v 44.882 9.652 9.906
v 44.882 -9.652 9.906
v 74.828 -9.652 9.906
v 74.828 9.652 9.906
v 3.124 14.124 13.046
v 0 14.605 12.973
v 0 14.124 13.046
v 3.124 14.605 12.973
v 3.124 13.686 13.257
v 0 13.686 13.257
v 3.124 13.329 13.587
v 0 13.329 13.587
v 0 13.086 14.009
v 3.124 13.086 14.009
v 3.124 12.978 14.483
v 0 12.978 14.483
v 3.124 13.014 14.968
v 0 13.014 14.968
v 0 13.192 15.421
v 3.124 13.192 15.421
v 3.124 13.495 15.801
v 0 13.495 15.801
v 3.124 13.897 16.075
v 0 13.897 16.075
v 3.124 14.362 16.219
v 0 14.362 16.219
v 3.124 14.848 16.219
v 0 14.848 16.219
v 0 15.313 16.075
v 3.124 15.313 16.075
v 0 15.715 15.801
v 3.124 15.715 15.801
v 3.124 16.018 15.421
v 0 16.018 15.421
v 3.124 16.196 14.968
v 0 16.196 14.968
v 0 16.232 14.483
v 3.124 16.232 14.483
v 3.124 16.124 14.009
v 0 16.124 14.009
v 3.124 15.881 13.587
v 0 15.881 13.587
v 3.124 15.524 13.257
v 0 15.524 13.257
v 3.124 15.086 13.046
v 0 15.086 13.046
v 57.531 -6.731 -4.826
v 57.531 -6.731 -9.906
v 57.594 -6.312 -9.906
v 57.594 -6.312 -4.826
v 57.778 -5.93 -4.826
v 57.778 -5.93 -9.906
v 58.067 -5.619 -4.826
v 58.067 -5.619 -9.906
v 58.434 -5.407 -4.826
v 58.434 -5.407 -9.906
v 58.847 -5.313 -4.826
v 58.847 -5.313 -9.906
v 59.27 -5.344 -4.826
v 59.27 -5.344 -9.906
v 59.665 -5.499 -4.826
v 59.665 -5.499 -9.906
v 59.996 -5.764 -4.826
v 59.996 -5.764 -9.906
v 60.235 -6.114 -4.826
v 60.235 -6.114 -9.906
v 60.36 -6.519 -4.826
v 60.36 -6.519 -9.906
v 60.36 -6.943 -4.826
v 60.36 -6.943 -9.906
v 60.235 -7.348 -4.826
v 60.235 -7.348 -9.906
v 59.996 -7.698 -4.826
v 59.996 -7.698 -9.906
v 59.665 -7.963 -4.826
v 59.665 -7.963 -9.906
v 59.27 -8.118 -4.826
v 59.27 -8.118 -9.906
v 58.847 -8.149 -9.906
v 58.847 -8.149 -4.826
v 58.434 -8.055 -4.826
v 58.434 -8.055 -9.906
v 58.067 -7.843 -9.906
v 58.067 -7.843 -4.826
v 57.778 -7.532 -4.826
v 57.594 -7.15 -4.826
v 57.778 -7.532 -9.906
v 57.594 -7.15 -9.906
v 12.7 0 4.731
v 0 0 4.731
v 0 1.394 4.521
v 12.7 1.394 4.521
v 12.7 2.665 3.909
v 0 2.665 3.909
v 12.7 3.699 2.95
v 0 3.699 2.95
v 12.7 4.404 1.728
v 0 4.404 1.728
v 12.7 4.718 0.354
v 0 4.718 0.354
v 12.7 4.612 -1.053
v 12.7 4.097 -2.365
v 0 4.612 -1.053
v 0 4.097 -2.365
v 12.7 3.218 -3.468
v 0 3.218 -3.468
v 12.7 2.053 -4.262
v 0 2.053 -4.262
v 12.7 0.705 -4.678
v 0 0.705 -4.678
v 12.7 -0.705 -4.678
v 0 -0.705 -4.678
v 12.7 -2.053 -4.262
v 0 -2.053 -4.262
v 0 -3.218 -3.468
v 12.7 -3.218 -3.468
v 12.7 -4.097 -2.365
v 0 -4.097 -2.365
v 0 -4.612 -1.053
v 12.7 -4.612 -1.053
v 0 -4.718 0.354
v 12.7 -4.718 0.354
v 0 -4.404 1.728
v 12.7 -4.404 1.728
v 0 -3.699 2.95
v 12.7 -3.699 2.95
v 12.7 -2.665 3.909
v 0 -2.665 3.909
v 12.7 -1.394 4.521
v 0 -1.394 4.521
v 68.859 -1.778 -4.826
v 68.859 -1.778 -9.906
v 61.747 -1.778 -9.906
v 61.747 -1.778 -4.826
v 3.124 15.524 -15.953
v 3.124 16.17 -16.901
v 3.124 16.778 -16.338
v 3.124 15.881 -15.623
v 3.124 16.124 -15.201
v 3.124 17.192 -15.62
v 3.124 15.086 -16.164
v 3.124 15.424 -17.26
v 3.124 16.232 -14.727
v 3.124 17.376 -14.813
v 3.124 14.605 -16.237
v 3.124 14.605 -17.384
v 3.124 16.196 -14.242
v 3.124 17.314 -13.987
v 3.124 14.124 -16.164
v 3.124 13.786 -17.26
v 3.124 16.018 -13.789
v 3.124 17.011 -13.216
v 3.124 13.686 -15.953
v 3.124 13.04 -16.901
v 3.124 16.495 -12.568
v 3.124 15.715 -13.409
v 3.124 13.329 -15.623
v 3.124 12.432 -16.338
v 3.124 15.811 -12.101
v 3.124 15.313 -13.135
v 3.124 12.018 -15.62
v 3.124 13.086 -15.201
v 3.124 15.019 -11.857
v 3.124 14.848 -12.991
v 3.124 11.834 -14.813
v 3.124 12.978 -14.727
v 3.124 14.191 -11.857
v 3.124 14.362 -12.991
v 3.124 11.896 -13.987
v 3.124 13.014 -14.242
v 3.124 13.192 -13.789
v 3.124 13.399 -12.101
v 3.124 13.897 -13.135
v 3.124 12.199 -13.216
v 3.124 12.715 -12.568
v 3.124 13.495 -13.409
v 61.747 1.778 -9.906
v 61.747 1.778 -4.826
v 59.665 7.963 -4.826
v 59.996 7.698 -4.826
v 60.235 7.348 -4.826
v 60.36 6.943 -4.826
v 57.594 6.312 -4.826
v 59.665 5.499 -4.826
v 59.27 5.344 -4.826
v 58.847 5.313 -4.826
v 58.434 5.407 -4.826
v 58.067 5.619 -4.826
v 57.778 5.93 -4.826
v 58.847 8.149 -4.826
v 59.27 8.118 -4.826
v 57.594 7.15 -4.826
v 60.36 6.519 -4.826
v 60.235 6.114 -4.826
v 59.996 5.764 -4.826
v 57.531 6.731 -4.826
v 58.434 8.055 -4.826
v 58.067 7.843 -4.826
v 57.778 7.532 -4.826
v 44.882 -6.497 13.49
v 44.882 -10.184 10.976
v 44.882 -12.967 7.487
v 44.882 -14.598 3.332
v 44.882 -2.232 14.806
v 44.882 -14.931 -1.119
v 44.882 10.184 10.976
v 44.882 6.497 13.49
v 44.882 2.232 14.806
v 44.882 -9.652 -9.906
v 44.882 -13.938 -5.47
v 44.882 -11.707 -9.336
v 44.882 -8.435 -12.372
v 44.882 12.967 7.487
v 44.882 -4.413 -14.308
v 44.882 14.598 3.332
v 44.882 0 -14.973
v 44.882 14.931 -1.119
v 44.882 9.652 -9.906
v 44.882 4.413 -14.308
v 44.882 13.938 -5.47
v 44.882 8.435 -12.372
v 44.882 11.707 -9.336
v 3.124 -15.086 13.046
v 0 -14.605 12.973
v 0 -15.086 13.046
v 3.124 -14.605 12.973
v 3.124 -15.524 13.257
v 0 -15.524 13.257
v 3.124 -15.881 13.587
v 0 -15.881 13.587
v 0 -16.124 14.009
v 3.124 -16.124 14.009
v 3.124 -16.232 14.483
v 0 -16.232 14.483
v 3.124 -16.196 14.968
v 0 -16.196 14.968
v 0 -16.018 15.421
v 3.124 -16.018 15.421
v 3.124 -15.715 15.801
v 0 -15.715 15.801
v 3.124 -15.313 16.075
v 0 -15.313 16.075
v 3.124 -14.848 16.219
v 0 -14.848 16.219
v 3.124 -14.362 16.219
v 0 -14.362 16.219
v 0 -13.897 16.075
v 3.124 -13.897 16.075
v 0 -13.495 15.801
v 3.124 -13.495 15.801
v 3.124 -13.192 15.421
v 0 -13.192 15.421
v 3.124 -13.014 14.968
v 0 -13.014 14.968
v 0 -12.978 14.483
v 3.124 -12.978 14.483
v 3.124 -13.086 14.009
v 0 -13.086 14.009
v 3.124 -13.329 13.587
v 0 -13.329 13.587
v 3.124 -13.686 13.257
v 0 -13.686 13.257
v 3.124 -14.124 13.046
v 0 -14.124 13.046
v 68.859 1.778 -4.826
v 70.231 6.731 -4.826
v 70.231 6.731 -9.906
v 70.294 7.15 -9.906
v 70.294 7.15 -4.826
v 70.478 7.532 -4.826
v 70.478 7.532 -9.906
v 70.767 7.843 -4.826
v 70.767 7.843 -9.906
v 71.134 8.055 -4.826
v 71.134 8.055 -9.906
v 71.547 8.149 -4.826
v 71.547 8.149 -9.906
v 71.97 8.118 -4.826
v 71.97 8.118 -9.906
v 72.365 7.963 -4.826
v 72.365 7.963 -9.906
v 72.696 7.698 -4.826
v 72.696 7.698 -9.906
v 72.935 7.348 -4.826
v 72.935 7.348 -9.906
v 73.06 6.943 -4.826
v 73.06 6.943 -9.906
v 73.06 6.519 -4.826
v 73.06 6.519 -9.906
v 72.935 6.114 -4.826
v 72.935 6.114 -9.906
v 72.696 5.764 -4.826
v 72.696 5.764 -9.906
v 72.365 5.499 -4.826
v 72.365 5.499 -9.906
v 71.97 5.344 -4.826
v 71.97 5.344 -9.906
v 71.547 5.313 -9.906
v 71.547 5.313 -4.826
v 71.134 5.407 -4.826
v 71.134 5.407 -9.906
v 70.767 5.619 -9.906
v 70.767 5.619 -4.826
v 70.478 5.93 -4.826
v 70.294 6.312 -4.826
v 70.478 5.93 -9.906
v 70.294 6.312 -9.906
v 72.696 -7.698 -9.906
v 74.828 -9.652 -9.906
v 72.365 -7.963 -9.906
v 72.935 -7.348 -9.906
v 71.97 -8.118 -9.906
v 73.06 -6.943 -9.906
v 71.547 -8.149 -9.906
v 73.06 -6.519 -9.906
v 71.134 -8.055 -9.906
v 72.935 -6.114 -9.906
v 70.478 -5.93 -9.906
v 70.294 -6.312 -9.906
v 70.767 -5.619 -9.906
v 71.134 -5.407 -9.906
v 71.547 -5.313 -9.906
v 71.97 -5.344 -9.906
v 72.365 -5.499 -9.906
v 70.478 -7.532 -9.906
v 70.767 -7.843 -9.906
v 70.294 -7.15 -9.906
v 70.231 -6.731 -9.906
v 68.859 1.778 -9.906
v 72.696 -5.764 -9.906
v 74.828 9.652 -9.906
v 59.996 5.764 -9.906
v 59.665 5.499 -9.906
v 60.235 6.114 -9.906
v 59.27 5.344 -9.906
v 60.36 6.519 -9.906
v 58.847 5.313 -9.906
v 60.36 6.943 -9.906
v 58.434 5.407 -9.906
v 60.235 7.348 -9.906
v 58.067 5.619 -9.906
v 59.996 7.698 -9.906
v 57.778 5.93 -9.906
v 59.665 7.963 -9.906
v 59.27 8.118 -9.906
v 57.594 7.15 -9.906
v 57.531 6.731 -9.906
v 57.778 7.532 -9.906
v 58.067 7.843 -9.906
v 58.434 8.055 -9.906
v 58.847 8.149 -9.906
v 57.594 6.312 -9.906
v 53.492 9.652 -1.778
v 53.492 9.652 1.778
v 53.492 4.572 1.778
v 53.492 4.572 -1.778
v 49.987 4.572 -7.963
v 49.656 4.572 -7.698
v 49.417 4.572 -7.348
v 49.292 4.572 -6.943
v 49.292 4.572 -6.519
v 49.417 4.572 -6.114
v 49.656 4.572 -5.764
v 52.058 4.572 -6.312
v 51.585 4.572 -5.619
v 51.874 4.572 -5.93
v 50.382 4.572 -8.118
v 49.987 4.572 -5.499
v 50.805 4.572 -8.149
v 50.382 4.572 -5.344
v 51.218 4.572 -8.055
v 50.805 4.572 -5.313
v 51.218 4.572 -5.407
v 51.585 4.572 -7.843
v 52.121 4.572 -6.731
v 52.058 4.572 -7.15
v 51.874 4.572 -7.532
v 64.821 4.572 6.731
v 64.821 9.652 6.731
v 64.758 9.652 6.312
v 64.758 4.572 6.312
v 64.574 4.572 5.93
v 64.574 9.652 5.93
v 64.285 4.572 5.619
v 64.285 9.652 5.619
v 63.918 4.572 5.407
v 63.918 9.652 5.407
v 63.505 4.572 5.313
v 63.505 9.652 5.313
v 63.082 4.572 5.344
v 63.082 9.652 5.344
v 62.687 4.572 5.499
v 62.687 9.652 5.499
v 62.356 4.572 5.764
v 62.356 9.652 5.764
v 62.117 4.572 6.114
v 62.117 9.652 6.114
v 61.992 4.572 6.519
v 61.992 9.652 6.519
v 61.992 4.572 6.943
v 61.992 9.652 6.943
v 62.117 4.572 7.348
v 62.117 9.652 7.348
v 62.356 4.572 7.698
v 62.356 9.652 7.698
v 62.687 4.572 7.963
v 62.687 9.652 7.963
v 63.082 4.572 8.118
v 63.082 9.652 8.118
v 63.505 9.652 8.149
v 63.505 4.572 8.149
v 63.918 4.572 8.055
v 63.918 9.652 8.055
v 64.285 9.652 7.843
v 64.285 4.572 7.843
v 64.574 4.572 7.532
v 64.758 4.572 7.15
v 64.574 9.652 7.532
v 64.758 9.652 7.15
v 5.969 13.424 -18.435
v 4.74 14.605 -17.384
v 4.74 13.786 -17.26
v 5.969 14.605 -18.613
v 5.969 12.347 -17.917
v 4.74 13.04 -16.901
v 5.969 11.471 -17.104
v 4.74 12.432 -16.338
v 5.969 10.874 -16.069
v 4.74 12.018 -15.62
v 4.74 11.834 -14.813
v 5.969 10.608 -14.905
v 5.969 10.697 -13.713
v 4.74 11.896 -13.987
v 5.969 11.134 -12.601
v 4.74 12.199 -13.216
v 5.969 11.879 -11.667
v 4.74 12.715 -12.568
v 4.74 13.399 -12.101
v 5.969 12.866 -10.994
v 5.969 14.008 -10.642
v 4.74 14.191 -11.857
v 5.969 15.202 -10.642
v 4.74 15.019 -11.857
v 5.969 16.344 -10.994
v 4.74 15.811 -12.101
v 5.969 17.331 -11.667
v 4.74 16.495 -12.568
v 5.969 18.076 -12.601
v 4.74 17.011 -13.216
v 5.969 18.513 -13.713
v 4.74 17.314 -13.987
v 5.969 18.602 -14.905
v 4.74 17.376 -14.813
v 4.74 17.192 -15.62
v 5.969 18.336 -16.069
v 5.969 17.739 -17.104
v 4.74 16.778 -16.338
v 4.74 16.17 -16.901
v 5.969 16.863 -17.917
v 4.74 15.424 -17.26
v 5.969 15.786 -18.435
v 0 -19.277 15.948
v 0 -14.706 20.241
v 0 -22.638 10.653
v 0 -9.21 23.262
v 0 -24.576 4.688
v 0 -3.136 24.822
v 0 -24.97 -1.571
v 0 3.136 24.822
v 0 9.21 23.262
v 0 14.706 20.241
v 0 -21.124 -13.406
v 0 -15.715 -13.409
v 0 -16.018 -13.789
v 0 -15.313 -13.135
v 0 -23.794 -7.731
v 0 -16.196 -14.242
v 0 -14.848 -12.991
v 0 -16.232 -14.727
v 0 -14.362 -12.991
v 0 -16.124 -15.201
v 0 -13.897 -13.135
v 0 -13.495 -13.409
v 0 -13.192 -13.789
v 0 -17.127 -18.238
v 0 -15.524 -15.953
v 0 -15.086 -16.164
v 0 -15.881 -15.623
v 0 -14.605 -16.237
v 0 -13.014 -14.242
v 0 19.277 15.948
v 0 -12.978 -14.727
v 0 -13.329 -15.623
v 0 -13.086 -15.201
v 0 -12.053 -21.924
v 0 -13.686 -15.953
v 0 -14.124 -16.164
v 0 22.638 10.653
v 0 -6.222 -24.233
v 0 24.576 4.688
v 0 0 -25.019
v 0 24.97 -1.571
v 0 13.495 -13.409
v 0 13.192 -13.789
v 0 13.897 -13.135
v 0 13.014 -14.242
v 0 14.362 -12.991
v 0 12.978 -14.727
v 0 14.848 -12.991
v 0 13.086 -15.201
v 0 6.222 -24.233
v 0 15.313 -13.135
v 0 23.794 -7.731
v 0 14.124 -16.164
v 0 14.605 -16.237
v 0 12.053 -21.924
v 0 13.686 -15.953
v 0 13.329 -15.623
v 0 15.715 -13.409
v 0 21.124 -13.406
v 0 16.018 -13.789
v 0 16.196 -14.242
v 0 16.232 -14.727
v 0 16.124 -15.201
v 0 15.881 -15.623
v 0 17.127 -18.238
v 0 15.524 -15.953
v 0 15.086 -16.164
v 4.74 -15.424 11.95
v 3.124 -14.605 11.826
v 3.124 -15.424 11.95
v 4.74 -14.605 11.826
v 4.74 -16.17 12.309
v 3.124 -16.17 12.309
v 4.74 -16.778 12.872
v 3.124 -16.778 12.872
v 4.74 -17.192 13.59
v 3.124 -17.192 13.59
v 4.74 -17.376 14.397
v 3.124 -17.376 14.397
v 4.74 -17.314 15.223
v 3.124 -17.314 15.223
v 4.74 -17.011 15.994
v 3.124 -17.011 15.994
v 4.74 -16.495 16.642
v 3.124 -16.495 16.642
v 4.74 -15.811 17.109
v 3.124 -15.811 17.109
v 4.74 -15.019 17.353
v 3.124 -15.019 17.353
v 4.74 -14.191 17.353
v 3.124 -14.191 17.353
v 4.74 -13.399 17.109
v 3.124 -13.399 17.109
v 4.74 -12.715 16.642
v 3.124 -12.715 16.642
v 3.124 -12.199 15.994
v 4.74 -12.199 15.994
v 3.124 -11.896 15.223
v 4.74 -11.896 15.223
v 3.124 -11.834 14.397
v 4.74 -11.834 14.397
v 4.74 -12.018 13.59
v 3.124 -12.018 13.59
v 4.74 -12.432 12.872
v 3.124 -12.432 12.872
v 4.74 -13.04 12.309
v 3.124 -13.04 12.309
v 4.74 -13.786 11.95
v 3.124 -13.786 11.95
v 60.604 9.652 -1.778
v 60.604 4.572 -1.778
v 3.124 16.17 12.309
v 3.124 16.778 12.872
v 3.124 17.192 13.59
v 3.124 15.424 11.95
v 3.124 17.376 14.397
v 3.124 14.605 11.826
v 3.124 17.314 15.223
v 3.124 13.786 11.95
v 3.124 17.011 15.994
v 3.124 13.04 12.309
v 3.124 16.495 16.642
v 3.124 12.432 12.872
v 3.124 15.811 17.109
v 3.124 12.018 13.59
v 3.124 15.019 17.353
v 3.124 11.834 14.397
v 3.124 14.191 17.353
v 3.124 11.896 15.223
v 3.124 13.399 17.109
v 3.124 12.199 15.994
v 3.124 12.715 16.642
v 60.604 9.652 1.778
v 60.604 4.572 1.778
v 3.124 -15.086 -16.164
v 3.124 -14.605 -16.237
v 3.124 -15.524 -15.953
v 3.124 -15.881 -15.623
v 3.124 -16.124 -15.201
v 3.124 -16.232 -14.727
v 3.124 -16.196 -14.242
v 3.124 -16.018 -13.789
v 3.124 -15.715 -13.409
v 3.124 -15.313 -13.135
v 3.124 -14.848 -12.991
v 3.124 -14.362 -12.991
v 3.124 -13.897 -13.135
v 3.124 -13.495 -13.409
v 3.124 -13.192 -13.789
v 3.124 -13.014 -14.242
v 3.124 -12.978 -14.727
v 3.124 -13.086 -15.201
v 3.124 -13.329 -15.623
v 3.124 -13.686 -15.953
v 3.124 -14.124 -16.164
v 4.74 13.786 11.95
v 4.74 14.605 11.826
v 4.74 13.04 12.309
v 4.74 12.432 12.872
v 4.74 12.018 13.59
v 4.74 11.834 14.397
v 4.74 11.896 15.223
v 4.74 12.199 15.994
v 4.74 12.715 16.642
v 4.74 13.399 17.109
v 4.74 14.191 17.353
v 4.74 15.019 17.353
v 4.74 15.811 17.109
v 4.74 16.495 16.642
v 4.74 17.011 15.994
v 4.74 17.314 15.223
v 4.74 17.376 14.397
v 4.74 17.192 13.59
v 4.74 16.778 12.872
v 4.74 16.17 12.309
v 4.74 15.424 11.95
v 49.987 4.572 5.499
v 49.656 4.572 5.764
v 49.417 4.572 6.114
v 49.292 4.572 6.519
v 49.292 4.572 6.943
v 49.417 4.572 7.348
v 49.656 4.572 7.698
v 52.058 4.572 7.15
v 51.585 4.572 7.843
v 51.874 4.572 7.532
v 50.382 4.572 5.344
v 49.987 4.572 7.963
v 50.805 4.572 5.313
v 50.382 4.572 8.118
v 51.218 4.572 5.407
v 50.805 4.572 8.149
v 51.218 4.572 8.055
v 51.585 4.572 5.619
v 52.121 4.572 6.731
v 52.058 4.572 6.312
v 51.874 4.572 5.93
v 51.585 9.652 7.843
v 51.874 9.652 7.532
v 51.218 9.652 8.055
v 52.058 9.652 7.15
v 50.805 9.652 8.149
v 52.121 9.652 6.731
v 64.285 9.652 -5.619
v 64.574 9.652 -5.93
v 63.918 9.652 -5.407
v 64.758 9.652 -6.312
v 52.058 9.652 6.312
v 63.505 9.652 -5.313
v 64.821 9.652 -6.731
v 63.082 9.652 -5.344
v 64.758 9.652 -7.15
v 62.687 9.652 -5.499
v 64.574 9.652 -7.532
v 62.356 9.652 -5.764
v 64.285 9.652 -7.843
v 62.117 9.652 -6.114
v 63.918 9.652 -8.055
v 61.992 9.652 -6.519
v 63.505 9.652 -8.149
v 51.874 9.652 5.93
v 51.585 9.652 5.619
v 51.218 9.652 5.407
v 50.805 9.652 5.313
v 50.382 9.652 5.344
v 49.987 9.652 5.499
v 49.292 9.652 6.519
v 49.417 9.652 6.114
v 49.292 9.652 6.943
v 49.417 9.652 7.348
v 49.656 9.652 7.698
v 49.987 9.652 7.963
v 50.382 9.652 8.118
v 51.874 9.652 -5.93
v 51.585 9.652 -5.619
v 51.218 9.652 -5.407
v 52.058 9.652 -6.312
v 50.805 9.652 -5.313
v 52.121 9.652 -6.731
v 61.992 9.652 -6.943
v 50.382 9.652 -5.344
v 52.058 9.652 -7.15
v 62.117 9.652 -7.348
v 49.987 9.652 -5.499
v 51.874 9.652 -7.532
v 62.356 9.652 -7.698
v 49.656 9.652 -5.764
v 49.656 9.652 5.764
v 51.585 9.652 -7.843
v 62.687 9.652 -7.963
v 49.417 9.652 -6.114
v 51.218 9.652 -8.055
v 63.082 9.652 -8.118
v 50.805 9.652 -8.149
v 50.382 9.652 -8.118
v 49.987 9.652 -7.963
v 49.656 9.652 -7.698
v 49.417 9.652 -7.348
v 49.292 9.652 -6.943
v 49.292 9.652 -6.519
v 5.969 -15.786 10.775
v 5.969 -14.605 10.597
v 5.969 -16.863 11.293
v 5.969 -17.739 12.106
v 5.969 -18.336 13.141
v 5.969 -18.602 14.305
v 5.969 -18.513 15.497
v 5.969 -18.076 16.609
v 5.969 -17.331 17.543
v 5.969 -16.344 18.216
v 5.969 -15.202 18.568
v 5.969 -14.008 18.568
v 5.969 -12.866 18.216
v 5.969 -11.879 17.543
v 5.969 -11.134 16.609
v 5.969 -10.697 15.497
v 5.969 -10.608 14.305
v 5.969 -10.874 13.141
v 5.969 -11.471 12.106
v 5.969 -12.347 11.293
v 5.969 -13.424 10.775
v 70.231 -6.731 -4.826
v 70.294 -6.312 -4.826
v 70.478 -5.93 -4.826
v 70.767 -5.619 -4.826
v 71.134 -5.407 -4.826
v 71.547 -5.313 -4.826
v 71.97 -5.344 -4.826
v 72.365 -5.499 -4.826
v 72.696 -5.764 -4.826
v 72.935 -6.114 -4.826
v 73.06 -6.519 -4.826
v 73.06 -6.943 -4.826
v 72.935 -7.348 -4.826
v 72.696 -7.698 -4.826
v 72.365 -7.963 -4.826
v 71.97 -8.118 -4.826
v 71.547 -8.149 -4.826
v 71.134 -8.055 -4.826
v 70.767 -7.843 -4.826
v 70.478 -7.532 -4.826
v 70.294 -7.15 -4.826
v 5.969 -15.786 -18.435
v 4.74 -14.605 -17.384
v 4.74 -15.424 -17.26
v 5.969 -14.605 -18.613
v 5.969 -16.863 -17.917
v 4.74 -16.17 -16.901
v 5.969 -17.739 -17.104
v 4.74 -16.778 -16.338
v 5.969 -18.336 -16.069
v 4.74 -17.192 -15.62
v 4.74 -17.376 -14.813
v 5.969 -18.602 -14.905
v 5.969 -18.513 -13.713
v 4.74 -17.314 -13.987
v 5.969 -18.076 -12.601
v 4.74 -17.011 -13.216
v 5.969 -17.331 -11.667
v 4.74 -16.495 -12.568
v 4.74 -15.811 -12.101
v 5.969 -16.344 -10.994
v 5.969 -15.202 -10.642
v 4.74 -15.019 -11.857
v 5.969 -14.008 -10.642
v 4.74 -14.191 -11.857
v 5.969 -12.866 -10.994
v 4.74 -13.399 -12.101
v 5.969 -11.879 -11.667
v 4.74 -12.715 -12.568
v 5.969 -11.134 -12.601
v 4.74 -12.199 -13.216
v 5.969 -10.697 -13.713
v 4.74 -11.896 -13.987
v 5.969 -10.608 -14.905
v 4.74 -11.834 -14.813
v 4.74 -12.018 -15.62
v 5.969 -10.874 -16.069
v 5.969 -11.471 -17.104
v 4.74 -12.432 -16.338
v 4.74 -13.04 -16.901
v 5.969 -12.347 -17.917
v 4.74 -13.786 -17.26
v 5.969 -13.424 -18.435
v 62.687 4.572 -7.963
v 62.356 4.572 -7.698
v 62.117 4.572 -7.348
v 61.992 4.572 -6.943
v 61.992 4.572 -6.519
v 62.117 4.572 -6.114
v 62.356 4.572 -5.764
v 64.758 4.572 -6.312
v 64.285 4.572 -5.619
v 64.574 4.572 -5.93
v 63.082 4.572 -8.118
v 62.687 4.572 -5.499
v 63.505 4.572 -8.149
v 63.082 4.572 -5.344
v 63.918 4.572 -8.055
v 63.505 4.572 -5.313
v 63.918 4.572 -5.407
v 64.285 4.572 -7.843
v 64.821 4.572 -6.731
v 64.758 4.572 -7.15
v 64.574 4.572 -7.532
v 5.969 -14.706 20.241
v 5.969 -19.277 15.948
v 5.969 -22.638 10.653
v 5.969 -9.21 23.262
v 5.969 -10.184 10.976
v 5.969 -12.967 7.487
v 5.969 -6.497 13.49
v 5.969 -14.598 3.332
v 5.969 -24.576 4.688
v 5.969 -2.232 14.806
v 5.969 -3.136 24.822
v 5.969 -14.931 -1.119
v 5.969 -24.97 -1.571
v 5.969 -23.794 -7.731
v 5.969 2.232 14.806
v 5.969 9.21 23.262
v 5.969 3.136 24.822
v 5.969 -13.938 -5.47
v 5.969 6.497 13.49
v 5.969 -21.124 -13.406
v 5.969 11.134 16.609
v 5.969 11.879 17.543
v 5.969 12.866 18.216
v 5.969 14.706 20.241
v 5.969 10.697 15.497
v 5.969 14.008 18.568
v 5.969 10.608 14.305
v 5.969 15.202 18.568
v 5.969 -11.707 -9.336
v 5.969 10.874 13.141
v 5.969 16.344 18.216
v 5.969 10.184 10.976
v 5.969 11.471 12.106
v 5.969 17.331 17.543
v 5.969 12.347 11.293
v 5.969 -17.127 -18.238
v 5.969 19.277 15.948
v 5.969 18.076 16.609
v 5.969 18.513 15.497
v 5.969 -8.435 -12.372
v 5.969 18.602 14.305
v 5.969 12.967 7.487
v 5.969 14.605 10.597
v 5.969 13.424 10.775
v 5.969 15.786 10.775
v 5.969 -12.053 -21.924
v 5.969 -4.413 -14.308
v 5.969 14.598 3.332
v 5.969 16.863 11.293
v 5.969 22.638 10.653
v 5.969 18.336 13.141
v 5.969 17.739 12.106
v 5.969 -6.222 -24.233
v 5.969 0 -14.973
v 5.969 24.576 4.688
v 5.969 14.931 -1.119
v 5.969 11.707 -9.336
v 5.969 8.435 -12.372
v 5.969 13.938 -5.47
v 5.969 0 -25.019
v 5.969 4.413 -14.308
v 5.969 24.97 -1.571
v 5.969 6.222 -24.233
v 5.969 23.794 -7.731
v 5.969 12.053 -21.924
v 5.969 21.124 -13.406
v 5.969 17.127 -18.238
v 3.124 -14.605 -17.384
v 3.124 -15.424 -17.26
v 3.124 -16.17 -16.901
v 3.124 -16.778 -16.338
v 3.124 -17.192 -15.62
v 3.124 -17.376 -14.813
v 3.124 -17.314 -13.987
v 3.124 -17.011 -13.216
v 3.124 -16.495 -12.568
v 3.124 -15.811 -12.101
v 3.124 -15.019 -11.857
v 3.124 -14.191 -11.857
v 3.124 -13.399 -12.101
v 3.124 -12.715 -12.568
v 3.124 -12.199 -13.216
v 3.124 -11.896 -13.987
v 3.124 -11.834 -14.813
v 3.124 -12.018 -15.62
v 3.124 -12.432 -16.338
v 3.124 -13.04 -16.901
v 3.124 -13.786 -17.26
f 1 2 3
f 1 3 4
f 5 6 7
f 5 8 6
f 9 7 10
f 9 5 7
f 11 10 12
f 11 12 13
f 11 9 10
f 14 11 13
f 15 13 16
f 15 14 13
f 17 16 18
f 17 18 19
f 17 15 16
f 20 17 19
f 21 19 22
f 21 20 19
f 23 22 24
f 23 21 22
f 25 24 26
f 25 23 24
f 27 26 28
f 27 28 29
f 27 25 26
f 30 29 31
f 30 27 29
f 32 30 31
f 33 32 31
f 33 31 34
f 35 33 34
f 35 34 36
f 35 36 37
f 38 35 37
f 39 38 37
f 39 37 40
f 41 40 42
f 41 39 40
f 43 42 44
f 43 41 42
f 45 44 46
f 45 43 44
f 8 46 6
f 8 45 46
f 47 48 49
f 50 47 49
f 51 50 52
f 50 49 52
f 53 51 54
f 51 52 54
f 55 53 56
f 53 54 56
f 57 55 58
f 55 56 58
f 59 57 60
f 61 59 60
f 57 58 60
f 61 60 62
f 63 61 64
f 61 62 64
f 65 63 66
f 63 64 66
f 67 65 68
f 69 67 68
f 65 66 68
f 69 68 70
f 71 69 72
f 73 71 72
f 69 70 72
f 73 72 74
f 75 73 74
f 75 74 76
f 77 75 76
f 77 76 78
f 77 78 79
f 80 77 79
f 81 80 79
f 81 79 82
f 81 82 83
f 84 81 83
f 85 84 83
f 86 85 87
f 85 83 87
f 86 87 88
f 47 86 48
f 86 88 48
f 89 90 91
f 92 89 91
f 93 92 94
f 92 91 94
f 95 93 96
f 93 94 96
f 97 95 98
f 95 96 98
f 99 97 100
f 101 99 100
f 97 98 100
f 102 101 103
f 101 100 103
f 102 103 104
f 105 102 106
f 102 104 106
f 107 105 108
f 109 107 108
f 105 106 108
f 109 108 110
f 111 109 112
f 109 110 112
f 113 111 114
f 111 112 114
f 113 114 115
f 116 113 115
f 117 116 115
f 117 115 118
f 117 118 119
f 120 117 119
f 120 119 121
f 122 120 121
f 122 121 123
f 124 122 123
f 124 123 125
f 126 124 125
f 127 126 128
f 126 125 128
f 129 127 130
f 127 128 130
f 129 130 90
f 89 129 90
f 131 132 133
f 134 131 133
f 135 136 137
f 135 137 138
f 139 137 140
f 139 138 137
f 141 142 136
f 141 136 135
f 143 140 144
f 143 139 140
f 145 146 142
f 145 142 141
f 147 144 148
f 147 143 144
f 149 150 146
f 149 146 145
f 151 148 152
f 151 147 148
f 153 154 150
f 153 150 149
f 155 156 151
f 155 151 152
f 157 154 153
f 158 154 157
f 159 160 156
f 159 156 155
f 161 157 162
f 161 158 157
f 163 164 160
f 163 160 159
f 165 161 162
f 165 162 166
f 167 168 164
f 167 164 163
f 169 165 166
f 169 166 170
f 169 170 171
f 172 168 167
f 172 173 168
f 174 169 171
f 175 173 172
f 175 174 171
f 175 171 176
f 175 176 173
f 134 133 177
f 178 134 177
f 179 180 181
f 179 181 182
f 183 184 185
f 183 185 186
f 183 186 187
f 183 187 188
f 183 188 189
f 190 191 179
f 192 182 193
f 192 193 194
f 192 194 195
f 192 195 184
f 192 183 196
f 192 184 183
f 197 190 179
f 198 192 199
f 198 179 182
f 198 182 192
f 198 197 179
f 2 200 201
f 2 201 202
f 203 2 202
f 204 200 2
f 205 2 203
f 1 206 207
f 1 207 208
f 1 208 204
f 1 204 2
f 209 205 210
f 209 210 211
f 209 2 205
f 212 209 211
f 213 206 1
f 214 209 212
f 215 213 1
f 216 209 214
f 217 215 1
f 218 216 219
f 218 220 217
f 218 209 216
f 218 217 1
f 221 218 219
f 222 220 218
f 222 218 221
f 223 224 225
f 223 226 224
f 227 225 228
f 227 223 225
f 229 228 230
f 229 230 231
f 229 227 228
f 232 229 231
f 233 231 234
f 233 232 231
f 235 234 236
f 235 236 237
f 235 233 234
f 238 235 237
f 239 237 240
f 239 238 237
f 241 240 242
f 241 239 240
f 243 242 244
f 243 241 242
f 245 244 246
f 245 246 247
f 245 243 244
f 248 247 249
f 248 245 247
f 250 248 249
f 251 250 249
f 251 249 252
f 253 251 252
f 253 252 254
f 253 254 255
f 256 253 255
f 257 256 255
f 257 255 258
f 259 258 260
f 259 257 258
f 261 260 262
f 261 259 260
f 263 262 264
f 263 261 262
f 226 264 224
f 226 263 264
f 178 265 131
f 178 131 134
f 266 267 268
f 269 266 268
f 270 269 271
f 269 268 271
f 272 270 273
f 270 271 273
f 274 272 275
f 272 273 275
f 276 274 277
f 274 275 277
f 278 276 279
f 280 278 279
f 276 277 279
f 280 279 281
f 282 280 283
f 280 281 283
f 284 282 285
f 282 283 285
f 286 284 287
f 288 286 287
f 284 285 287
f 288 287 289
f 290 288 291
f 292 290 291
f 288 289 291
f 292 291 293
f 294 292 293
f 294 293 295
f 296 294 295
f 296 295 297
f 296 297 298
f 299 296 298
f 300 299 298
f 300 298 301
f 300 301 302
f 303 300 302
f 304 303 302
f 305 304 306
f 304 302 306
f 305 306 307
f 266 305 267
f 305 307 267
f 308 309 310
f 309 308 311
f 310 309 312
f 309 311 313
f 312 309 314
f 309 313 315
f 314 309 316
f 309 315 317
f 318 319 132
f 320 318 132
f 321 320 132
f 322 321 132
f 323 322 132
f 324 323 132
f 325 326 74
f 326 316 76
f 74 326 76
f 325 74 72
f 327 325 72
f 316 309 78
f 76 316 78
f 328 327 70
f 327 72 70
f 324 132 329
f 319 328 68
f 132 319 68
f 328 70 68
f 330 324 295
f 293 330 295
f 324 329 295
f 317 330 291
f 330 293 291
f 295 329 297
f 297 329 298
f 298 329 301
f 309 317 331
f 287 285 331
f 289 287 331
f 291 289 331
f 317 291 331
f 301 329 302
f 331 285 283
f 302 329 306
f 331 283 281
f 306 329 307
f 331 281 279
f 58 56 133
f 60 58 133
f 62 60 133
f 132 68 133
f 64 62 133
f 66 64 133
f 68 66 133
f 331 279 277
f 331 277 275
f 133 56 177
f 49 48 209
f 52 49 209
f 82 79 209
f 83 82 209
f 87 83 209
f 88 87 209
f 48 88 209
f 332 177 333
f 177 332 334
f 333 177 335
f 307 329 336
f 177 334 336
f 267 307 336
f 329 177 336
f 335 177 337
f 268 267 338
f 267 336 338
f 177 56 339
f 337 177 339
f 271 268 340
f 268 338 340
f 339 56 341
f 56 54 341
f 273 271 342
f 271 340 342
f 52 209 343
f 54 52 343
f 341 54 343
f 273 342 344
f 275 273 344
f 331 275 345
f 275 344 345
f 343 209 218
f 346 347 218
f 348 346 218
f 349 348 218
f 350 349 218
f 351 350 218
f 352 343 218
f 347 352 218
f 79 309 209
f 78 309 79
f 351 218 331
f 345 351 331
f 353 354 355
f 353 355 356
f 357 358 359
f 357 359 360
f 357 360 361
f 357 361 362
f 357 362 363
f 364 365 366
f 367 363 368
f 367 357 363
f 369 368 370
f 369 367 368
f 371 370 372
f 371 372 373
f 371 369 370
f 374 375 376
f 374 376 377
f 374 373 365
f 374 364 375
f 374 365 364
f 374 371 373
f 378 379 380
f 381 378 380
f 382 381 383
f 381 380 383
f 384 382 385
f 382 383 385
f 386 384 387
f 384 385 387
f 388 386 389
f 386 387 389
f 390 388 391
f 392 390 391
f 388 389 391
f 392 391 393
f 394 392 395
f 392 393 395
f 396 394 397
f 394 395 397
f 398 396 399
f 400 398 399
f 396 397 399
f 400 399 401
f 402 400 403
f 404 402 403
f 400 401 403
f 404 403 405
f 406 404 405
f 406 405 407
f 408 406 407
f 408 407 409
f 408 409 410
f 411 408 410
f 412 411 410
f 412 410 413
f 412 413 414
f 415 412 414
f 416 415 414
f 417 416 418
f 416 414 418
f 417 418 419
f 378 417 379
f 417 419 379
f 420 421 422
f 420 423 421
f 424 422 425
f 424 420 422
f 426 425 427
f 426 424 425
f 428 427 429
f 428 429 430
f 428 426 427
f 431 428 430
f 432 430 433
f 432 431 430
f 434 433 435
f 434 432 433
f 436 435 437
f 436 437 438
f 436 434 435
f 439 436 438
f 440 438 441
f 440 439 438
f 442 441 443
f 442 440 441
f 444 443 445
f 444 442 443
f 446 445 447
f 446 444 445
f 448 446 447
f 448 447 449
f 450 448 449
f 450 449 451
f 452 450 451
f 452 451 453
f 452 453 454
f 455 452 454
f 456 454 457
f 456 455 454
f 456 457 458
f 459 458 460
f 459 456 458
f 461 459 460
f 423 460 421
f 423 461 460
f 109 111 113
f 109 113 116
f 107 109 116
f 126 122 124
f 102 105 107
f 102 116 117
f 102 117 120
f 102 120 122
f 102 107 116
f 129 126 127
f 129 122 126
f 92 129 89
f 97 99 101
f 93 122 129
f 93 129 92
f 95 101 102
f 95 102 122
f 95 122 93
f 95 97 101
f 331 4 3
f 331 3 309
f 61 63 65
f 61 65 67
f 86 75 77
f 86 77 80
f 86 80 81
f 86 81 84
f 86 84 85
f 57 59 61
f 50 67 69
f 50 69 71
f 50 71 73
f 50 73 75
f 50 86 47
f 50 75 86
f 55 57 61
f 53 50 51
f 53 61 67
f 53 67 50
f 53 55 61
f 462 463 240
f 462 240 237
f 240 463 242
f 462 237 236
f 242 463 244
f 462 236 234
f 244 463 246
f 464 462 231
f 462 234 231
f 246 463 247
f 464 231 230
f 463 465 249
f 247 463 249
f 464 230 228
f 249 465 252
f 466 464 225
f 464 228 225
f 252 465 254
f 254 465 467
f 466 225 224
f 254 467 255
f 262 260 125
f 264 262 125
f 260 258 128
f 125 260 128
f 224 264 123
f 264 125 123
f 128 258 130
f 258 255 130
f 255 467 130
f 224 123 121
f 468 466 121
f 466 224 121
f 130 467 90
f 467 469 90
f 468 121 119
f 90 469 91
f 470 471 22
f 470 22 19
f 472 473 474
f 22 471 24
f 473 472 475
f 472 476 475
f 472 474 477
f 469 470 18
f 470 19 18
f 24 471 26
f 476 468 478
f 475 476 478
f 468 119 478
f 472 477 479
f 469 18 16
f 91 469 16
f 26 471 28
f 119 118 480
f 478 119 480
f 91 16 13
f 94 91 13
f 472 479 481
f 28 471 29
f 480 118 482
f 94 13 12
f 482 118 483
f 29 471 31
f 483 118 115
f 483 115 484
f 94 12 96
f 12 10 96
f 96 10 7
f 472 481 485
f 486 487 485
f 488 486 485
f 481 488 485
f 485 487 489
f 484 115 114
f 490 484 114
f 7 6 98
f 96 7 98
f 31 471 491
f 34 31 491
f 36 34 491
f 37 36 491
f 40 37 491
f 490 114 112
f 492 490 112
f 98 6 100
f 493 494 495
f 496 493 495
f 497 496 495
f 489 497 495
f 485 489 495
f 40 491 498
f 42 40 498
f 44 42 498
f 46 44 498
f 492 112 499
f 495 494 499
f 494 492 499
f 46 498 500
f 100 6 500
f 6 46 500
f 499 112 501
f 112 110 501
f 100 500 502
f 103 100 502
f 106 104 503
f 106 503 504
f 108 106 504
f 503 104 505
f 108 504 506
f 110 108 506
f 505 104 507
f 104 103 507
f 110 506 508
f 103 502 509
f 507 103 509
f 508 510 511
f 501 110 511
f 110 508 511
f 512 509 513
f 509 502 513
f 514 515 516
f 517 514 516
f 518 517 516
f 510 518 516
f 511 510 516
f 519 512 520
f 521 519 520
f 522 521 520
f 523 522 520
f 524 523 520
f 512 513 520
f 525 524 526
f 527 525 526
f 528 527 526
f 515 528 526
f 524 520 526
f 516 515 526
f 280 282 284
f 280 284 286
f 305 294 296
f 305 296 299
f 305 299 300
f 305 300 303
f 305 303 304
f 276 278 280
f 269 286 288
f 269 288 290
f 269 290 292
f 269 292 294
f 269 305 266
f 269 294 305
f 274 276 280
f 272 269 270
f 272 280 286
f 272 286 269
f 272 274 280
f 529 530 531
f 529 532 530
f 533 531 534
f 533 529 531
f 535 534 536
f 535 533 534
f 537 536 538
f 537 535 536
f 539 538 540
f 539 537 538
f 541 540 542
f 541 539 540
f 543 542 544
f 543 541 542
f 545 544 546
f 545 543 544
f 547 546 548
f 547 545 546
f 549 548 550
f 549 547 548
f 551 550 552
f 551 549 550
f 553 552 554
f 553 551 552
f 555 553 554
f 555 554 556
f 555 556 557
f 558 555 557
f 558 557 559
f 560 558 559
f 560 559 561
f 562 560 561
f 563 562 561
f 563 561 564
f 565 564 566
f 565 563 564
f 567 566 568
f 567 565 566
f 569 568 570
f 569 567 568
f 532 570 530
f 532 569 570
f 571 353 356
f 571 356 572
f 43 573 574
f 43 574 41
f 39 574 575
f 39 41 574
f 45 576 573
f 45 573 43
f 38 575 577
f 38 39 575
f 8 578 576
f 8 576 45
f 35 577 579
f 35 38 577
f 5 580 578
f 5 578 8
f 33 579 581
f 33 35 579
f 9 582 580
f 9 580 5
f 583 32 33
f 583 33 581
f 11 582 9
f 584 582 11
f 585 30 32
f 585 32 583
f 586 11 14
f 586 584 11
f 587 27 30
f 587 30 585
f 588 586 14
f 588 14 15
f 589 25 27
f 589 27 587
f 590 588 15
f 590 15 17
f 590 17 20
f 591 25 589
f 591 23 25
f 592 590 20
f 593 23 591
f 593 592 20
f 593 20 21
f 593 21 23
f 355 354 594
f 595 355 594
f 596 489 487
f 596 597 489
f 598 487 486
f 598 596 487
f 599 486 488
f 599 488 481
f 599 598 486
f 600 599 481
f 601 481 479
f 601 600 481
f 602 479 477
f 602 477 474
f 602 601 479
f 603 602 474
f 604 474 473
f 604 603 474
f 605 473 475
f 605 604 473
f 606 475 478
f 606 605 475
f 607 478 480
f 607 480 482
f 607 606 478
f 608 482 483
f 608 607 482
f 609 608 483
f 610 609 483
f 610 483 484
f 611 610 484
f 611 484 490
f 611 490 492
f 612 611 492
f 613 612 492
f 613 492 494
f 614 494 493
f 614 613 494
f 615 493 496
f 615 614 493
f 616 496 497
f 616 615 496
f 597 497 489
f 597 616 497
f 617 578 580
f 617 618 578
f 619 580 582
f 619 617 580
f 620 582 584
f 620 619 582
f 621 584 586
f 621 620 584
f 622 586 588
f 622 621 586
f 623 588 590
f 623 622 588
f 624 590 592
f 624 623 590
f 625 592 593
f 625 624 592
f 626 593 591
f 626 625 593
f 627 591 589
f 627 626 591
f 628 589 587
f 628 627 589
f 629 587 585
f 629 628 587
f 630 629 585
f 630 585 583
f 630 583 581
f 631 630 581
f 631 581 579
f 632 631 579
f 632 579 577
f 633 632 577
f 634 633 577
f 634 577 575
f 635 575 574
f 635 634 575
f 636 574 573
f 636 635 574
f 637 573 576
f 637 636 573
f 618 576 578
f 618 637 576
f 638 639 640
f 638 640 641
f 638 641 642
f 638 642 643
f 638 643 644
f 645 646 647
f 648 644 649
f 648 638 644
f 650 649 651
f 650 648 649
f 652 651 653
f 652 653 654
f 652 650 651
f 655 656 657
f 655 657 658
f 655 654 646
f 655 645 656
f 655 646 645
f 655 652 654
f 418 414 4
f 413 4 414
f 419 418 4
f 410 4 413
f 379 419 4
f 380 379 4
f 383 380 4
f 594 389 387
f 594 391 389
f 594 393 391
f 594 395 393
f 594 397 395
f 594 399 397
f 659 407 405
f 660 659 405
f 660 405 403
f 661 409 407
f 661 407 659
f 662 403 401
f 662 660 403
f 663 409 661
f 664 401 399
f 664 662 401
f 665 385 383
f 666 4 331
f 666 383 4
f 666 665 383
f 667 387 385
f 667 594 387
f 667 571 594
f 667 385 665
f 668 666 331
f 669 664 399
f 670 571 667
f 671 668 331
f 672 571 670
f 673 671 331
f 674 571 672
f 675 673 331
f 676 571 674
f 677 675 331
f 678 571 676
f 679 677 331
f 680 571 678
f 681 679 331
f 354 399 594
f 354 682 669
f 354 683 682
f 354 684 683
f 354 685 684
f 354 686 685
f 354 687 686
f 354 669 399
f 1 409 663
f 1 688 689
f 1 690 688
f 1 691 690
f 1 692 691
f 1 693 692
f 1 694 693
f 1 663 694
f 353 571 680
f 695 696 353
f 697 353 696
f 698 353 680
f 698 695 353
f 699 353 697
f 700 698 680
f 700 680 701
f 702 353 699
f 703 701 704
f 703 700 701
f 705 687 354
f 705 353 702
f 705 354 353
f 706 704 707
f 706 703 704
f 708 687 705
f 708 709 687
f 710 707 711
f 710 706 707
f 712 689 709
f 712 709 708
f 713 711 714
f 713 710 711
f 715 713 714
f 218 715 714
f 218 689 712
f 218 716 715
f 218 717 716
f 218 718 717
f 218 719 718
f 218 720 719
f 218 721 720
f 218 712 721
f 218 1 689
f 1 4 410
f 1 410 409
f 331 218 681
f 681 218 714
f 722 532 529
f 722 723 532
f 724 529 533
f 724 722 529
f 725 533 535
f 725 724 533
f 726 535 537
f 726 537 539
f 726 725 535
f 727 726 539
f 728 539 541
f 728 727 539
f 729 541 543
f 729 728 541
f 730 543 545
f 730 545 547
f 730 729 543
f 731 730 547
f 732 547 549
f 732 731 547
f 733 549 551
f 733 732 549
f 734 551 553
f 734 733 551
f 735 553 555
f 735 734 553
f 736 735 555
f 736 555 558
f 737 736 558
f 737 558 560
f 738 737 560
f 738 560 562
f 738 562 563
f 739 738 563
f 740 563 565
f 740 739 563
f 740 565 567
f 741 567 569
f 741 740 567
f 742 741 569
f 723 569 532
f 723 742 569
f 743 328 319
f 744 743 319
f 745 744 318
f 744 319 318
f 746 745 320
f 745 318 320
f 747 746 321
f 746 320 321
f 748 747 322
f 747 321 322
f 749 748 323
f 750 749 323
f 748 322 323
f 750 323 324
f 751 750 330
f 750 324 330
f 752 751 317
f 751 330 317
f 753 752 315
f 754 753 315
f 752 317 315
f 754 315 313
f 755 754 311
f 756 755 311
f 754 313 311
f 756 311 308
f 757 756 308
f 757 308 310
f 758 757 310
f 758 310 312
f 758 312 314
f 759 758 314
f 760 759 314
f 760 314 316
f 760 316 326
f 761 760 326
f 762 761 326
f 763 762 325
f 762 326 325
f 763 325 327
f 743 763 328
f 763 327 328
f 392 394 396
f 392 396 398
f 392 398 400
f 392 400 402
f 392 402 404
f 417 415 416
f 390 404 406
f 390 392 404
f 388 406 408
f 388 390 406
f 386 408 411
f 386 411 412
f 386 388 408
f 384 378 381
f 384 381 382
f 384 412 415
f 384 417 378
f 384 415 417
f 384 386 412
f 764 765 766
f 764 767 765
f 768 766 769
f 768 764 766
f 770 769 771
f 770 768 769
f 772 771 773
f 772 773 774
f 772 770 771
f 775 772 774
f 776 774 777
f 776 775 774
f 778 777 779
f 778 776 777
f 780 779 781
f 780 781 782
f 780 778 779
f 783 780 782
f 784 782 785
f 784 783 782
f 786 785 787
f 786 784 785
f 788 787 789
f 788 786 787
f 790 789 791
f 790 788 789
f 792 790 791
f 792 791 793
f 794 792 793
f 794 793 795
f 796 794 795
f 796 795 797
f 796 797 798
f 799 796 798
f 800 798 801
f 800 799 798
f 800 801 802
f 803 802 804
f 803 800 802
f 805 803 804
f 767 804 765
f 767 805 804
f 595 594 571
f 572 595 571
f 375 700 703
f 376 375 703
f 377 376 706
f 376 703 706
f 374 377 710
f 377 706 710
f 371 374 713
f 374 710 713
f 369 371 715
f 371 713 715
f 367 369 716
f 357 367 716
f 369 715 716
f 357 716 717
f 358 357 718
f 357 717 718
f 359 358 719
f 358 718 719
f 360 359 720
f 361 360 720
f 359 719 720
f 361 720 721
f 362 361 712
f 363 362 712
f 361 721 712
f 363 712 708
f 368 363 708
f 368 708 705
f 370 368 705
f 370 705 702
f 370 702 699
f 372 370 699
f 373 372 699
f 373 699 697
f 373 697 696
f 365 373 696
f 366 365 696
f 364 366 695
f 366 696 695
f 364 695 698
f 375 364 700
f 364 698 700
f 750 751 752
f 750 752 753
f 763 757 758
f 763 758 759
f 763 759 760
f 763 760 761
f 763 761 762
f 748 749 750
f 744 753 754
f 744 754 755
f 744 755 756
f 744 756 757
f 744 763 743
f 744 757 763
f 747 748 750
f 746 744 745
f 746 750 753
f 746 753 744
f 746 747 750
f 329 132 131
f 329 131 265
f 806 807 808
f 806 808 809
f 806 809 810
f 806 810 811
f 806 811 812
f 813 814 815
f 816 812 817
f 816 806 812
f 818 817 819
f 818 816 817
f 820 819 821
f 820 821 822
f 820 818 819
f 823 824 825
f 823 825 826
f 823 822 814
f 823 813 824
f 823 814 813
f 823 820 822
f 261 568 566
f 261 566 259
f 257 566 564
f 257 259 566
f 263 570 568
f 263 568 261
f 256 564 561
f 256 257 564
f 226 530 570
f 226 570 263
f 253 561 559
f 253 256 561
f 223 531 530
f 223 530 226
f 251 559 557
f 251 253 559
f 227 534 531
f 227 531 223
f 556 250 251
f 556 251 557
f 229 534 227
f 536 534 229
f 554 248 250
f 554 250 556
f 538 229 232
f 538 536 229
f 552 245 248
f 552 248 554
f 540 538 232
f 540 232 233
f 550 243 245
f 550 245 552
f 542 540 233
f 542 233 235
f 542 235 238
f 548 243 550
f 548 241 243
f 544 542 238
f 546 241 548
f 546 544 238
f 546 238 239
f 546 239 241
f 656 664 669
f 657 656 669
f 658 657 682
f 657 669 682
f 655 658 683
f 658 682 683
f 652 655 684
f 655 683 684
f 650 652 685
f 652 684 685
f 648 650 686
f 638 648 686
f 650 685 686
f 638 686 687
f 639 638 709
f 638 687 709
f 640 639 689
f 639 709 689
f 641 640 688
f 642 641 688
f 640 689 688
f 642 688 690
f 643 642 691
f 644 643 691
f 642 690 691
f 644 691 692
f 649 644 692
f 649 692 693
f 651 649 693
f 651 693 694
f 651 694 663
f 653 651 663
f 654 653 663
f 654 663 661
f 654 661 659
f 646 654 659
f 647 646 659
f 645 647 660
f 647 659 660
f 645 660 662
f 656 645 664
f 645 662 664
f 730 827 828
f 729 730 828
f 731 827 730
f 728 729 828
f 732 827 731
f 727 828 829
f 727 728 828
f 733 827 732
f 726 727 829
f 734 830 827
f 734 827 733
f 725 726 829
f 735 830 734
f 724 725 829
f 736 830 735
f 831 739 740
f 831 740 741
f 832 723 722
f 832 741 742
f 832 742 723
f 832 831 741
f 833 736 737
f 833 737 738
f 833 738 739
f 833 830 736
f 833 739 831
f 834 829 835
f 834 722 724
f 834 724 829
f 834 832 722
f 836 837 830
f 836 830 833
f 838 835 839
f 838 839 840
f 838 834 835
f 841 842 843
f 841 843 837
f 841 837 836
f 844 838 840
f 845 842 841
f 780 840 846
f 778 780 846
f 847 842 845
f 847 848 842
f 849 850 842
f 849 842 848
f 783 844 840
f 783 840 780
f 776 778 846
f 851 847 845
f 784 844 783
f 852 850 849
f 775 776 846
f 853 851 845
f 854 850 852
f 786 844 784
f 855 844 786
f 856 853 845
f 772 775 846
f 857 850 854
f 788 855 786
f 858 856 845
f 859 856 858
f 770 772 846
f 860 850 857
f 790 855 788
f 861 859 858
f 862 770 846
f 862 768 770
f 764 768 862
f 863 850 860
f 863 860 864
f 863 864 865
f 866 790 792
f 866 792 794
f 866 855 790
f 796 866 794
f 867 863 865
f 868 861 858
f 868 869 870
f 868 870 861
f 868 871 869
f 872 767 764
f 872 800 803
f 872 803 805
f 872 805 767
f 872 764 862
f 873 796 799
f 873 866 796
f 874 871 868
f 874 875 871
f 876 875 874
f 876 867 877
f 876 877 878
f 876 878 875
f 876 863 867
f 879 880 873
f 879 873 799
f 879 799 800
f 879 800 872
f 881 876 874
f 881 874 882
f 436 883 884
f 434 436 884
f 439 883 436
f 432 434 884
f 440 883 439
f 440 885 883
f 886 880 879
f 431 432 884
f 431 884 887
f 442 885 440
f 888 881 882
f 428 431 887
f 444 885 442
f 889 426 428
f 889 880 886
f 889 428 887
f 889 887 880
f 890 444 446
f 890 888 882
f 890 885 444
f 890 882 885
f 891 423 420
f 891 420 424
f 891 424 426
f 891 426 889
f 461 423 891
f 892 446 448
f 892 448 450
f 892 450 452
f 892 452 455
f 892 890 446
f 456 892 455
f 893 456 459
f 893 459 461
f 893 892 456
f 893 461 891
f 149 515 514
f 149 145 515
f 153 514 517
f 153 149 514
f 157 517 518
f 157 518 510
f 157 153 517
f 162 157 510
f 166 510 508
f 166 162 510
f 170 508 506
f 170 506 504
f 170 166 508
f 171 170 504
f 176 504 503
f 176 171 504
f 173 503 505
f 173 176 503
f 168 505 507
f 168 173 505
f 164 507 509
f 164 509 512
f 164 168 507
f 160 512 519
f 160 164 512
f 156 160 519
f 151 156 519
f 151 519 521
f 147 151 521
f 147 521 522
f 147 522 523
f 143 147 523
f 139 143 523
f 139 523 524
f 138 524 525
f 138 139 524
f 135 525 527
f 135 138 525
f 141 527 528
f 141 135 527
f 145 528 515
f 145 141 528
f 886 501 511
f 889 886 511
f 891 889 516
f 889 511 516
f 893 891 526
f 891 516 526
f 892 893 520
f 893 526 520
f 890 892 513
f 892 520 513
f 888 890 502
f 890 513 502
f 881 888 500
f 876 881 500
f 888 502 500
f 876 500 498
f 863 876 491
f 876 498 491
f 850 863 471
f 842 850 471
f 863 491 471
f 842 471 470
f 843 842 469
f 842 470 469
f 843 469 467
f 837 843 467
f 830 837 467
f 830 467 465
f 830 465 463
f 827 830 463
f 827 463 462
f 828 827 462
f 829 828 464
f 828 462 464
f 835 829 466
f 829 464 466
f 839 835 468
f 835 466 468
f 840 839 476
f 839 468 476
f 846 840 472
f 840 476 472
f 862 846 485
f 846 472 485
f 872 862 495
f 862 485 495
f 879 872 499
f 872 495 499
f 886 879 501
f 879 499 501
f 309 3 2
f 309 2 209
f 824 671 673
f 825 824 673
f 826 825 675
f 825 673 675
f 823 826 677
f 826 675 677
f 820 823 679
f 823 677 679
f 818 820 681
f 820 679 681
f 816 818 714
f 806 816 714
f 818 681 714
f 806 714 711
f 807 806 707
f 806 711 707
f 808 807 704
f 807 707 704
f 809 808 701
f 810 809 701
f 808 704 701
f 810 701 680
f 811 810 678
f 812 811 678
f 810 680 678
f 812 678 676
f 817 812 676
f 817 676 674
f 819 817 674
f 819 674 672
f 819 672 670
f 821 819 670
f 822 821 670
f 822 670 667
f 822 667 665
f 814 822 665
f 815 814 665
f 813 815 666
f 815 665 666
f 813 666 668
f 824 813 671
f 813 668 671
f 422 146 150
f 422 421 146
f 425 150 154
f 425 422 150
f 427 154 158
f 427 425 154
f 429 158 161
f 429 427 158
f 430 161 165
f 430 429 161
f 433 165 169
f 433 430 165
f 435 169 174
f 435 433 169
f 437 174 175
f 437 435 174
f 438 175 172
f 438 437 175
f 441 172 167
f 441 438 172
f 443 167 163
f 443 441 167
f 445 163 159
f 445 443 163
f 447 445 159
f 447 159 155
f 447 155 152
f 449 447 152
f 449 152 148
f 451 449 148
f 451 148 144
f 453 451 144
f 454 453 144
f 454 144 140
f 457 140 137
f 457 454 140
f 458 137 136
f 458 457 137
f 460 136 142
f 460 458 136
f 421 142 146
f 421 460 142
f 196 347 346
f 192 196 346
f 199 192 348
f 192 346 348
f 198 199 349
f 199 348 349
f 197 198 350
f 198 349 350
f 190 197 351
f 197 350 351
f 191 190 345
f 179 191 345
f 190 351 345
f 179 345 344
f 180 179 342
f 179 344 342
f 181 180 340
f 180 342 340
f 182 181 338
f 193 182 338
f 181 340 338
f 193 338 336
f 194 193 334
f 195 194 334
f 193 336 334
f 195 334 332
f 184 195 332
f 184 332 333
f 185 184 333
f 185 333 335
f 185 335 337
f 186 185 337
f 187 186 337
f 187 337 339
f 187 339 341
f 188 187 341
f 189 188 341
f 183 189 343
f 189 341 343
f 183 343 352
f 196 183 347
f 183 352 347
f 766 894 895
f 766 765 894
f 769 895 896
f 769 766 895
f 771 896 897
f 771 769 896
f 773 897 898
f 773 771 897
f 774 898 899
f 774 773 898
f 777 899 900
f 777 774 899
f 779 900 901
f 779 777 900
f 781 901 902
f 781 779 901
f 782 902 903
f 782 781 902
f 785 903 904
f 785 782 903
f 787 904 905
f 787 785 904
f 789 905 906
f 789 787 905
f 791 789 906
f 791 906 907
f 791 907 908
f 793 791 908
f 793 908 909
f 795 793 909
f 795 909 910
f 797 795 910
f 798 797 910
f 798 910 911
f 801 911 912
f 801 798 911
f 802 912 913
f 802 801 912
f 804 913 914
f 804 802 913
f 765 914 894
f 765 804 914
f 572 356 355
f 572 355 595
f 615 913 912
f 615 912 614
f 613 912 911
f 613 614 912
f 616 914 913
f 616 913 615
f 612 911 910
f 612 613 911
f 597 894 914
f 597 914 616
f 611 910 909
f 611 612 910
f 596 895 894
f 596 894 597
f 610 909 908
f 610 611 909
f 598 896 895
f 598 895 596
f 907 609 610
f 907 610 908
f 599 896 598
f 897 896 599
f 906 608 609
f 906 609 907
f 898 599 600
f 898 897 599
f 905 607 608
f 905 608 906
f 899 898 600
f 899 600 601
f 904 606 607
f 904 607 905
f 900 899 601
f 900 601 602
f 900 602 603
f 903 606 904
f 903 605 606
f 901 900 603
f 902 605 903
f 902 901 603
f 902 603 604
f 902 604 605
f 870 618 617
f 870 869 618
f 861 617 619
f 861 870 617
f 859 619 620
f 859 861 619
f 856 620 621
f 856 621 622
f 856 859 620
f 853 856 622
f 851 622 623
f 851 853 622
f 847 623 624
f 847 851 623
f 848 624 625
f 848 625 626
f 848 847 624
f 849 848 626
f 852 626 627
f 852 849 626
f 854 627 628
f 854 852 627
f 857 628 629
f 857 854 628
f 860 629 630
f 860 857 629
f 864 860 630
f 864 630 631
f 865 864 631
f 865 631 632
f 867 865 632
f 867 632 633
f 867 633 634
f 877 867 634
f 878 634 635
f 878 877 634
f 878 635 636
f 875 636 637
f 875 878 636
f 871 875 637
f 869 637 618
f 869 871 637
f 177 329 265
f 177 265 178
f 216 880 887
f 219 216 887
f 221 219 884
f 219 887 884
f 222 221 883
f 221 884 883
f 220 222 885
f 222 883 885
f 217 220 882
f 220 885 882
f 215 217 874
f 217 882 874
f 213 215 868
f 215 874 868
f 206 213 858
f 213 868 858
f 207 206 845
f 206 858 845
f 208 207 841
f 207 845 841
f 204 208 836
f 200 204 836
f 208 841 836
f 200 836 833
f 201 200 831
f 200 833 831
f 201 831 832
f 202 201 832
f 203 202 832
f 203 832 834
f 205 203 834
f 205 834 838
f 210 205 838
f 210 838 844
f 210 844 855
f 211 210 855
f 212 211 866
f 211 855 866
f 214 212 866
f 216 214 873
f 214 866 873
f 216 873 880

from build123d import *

# Parameters (mm, degrees)
SKETCH1_R                                     = 25.019
BOSS_EXTRUDE1_DEPTH                           = 5.969
SKETCH2_R                                     = 14.9733
BOSS_EXTRUDE2_DEPTH                           = 38.9128
SKETCH3_W                                     = 19.812
SKETCH3_H                                     = 19.304
BOSS_EXTRUDE3_DEPTH                           = 29.9466
CBORE_FOR_4_SOCKET_HEAD_CAP_SCREW1_AT_2_COUNT = 2
CBORE_FOR_4_SOCKET_HEAD_CAP_SCREW1_AT_2_PITCH = 29.21
CBORE_FOR_4_SOCKET_HEAD_CAP_SCREW1_AT_3_COUNT = 2
CBORE_FOR_4_SOCKET_HEAD_CAP_SCREW1_AT_3_PITCH = 29.21
CBORE_FOR_4_SOCKET_HEAD_CAP_SCREW1_AT_4_COUNT = 2
CBORE_FOR_4_SOCKET_HEAD_CAP_SCREW1_AT_4_PITCH = 41.309178157
SKETCH6_R                                     = 1.4224
SKETCH6_W                                     = 7.112
SKETCH6_H                                     = 3.556
CUT_EXTRUDE1_DEPTH                            = 5.08
SKETCH7_R                                     = 1.4224
SKETCH7_W                                     = 7.112
SKETCH7_H                                     = 3.556
CUT_EXTRUDE2_DEPTH                            = 5.08
SKETCH8_R                                     = 4.73075
CUT_EXTRUDE3_DEPTH                            = 12.7


with BuildPart() as part:
    # Sketch1 → Boss-Extrude1 (new body)
    with BuildSketch(Plane(origin=(0, 0, 0), x_dir=(0, 0, -1), z_dir=(1, 0, 0))):
        Circle(SKETCH1_R)
    extrude(amount=BOSS_EXTRUDE1_DEPTH)

    # Sketch2 → Boss-Extrude2 (add)
    with BuildSketch(Plane(origin=(5.969, 0, 0), x_dir=(0, 0, -1), z_dir=(1, 0, 0))):
        Circle(SKETCH2_R)
    extrude(amount=BOSS_EXTRUDE2_DEPTH)

    # Sketch3 → Boss-Extrude3 (add)
    with BuildSketch(Plane(origin=(44.8818, 0, 0), x_dir=(0, 0, -1), z_dir=(1, 0, 0))):
        Rectangle(SKETCH3_W, SKETCH3_H)
    extrude(amount=BOSS_EXTRUDE3_DEPTH)

    # Sketch4 → CBORE for #4 Socket Head Cap Screw1 (revolve, cut)
    with BuildSketch(Plane(origin=(5.969, 14.605, -14.605), x_dir=(0, 0, -1), z_dir=(0, 1, 0))):
        Polygon((0, 0), (0, 5.969), (1.63195, 5.969), (1.63195, 2.8448), (2.77876, 2.8448), (2.77876, 1.22936), (4.00812, 0), align=None)
    cbore_for_4_socket_head_cap_screw1 = revolve(axis=Axis((12.319, 14.605, -14.605), (-1, 0, 0)), mode=Mode.SUBTRACT)

    # CBORE for #4 Socket Head Cap Screw1 at 2: CBORE for #4 Socket Head Cap Screw1 ×2
    with Locations(*[(0, 0, i * CBORE_FOR_4_SOCKET_HEAD_CAP_SCREW1_AT_2_PITCH) for i in range(1, CBORE_FOR_4_SOCKET_HEAD_CAP_SCREW1_AT_2_COUNT)]):
        add(cbore_for_4_socket_head_cap_screw1, mode=Mode.SUBTRACT)

    # CBORE for #4 Socket Head Cap Screw1 at 3: CBORE for #4 Socket Head Cap Screw1 ×2
    with Locations(*[(0, -i * CBORE_FOR_4_SOCKET_HEAD_CAP_SCREW1_AT_3_PITCH, 0) for i in range(1, CBORE_FOR_4_SOCKET_HEAD_CAP_SCREW1_AT_3_COUNT)]):
        add(cbore_for_4_socket_head_cap_screw1, mode=Mode.SUBTRACT)

    # CBORE for #4 Socket Head Cap Screw1 at 4: CBORE for #4 Socket Head Cap Screw1 ×2
    with Locations(*[Vector(0, -0.707106781, 0.707106781) * (i * CBORE_FOR_4_SOCKET_HEAD_CAP_SCREW1_AT_4_PITCH) for i in range(1, CBORE_FOR_4_SOCKET_HEAD_CAP_SCREW1_AT_4_COUNT)]):
        add(cbore_for_4_socket_head_cap_screw1, mode=Mode.SUBTRACT)

    # Sketch6 → Cut-Extrude1 (cut)
    with BuildSketch(Plane(origin=(0, 9.652, 0), x_dir=(1, 0, 0), z_dir=(0, 1, 0))):
        with Locations((63.3984, 6.731)):
            Circle(SKETCH6_R)
        with Locations((50.6984, 6.731)):
            Circle(SKETCH6_R)
        with Locations((50.6984, -6.731)):
            Circle(SKETCH6_R)
        with Locations((63.3984, -6.731)):
            Circle(SKETCH6_R)
        with Locations((57.0484, 0)):
            Rectangle(SKETCH6_W, SKETCH6_H)
    extrude(amount=-CUT_EXTRUDE1_DEPTH, mode=Mode.SUBTRACT)

    # Sketch7 → Cut-Extrude2 (cut)
    with BuildSketch(Plane(origin=(0, 0, -9.906), x_dir=(-1, 0, 0), z_dir=(0, 0, -1))):
        with Locations((-71.6534, 6.731)):
            Circle(SKETCH7_R)
        with Locations((-58.9534, 6.731)):
            Circle(SKETCH7_R)
        with Locations((-58.9534, -6.731)):
            Circle(SKETCH7_R)
        with Locations((-71.6534, -6.731)):
            Circle(SKETCH7_R)
        with Locations((-65.3034, 0)):
            Rectangle(SKETCH7_W, SKETCH7_H)
    extrude(amount=-CUT_EXTRUDE2_DEPTH, mode=Mode.SUBTRACT)

    # Sketch8 → Cut-Extrude3 (cut)
    with BuildSketch(Plane.ZY):
        Circle(SKETCH8_R)
    extrude(amount=-CUT_EXTRUDE3_DEPTH, mode=Mode.SUBTRACT)


solid = part.part
